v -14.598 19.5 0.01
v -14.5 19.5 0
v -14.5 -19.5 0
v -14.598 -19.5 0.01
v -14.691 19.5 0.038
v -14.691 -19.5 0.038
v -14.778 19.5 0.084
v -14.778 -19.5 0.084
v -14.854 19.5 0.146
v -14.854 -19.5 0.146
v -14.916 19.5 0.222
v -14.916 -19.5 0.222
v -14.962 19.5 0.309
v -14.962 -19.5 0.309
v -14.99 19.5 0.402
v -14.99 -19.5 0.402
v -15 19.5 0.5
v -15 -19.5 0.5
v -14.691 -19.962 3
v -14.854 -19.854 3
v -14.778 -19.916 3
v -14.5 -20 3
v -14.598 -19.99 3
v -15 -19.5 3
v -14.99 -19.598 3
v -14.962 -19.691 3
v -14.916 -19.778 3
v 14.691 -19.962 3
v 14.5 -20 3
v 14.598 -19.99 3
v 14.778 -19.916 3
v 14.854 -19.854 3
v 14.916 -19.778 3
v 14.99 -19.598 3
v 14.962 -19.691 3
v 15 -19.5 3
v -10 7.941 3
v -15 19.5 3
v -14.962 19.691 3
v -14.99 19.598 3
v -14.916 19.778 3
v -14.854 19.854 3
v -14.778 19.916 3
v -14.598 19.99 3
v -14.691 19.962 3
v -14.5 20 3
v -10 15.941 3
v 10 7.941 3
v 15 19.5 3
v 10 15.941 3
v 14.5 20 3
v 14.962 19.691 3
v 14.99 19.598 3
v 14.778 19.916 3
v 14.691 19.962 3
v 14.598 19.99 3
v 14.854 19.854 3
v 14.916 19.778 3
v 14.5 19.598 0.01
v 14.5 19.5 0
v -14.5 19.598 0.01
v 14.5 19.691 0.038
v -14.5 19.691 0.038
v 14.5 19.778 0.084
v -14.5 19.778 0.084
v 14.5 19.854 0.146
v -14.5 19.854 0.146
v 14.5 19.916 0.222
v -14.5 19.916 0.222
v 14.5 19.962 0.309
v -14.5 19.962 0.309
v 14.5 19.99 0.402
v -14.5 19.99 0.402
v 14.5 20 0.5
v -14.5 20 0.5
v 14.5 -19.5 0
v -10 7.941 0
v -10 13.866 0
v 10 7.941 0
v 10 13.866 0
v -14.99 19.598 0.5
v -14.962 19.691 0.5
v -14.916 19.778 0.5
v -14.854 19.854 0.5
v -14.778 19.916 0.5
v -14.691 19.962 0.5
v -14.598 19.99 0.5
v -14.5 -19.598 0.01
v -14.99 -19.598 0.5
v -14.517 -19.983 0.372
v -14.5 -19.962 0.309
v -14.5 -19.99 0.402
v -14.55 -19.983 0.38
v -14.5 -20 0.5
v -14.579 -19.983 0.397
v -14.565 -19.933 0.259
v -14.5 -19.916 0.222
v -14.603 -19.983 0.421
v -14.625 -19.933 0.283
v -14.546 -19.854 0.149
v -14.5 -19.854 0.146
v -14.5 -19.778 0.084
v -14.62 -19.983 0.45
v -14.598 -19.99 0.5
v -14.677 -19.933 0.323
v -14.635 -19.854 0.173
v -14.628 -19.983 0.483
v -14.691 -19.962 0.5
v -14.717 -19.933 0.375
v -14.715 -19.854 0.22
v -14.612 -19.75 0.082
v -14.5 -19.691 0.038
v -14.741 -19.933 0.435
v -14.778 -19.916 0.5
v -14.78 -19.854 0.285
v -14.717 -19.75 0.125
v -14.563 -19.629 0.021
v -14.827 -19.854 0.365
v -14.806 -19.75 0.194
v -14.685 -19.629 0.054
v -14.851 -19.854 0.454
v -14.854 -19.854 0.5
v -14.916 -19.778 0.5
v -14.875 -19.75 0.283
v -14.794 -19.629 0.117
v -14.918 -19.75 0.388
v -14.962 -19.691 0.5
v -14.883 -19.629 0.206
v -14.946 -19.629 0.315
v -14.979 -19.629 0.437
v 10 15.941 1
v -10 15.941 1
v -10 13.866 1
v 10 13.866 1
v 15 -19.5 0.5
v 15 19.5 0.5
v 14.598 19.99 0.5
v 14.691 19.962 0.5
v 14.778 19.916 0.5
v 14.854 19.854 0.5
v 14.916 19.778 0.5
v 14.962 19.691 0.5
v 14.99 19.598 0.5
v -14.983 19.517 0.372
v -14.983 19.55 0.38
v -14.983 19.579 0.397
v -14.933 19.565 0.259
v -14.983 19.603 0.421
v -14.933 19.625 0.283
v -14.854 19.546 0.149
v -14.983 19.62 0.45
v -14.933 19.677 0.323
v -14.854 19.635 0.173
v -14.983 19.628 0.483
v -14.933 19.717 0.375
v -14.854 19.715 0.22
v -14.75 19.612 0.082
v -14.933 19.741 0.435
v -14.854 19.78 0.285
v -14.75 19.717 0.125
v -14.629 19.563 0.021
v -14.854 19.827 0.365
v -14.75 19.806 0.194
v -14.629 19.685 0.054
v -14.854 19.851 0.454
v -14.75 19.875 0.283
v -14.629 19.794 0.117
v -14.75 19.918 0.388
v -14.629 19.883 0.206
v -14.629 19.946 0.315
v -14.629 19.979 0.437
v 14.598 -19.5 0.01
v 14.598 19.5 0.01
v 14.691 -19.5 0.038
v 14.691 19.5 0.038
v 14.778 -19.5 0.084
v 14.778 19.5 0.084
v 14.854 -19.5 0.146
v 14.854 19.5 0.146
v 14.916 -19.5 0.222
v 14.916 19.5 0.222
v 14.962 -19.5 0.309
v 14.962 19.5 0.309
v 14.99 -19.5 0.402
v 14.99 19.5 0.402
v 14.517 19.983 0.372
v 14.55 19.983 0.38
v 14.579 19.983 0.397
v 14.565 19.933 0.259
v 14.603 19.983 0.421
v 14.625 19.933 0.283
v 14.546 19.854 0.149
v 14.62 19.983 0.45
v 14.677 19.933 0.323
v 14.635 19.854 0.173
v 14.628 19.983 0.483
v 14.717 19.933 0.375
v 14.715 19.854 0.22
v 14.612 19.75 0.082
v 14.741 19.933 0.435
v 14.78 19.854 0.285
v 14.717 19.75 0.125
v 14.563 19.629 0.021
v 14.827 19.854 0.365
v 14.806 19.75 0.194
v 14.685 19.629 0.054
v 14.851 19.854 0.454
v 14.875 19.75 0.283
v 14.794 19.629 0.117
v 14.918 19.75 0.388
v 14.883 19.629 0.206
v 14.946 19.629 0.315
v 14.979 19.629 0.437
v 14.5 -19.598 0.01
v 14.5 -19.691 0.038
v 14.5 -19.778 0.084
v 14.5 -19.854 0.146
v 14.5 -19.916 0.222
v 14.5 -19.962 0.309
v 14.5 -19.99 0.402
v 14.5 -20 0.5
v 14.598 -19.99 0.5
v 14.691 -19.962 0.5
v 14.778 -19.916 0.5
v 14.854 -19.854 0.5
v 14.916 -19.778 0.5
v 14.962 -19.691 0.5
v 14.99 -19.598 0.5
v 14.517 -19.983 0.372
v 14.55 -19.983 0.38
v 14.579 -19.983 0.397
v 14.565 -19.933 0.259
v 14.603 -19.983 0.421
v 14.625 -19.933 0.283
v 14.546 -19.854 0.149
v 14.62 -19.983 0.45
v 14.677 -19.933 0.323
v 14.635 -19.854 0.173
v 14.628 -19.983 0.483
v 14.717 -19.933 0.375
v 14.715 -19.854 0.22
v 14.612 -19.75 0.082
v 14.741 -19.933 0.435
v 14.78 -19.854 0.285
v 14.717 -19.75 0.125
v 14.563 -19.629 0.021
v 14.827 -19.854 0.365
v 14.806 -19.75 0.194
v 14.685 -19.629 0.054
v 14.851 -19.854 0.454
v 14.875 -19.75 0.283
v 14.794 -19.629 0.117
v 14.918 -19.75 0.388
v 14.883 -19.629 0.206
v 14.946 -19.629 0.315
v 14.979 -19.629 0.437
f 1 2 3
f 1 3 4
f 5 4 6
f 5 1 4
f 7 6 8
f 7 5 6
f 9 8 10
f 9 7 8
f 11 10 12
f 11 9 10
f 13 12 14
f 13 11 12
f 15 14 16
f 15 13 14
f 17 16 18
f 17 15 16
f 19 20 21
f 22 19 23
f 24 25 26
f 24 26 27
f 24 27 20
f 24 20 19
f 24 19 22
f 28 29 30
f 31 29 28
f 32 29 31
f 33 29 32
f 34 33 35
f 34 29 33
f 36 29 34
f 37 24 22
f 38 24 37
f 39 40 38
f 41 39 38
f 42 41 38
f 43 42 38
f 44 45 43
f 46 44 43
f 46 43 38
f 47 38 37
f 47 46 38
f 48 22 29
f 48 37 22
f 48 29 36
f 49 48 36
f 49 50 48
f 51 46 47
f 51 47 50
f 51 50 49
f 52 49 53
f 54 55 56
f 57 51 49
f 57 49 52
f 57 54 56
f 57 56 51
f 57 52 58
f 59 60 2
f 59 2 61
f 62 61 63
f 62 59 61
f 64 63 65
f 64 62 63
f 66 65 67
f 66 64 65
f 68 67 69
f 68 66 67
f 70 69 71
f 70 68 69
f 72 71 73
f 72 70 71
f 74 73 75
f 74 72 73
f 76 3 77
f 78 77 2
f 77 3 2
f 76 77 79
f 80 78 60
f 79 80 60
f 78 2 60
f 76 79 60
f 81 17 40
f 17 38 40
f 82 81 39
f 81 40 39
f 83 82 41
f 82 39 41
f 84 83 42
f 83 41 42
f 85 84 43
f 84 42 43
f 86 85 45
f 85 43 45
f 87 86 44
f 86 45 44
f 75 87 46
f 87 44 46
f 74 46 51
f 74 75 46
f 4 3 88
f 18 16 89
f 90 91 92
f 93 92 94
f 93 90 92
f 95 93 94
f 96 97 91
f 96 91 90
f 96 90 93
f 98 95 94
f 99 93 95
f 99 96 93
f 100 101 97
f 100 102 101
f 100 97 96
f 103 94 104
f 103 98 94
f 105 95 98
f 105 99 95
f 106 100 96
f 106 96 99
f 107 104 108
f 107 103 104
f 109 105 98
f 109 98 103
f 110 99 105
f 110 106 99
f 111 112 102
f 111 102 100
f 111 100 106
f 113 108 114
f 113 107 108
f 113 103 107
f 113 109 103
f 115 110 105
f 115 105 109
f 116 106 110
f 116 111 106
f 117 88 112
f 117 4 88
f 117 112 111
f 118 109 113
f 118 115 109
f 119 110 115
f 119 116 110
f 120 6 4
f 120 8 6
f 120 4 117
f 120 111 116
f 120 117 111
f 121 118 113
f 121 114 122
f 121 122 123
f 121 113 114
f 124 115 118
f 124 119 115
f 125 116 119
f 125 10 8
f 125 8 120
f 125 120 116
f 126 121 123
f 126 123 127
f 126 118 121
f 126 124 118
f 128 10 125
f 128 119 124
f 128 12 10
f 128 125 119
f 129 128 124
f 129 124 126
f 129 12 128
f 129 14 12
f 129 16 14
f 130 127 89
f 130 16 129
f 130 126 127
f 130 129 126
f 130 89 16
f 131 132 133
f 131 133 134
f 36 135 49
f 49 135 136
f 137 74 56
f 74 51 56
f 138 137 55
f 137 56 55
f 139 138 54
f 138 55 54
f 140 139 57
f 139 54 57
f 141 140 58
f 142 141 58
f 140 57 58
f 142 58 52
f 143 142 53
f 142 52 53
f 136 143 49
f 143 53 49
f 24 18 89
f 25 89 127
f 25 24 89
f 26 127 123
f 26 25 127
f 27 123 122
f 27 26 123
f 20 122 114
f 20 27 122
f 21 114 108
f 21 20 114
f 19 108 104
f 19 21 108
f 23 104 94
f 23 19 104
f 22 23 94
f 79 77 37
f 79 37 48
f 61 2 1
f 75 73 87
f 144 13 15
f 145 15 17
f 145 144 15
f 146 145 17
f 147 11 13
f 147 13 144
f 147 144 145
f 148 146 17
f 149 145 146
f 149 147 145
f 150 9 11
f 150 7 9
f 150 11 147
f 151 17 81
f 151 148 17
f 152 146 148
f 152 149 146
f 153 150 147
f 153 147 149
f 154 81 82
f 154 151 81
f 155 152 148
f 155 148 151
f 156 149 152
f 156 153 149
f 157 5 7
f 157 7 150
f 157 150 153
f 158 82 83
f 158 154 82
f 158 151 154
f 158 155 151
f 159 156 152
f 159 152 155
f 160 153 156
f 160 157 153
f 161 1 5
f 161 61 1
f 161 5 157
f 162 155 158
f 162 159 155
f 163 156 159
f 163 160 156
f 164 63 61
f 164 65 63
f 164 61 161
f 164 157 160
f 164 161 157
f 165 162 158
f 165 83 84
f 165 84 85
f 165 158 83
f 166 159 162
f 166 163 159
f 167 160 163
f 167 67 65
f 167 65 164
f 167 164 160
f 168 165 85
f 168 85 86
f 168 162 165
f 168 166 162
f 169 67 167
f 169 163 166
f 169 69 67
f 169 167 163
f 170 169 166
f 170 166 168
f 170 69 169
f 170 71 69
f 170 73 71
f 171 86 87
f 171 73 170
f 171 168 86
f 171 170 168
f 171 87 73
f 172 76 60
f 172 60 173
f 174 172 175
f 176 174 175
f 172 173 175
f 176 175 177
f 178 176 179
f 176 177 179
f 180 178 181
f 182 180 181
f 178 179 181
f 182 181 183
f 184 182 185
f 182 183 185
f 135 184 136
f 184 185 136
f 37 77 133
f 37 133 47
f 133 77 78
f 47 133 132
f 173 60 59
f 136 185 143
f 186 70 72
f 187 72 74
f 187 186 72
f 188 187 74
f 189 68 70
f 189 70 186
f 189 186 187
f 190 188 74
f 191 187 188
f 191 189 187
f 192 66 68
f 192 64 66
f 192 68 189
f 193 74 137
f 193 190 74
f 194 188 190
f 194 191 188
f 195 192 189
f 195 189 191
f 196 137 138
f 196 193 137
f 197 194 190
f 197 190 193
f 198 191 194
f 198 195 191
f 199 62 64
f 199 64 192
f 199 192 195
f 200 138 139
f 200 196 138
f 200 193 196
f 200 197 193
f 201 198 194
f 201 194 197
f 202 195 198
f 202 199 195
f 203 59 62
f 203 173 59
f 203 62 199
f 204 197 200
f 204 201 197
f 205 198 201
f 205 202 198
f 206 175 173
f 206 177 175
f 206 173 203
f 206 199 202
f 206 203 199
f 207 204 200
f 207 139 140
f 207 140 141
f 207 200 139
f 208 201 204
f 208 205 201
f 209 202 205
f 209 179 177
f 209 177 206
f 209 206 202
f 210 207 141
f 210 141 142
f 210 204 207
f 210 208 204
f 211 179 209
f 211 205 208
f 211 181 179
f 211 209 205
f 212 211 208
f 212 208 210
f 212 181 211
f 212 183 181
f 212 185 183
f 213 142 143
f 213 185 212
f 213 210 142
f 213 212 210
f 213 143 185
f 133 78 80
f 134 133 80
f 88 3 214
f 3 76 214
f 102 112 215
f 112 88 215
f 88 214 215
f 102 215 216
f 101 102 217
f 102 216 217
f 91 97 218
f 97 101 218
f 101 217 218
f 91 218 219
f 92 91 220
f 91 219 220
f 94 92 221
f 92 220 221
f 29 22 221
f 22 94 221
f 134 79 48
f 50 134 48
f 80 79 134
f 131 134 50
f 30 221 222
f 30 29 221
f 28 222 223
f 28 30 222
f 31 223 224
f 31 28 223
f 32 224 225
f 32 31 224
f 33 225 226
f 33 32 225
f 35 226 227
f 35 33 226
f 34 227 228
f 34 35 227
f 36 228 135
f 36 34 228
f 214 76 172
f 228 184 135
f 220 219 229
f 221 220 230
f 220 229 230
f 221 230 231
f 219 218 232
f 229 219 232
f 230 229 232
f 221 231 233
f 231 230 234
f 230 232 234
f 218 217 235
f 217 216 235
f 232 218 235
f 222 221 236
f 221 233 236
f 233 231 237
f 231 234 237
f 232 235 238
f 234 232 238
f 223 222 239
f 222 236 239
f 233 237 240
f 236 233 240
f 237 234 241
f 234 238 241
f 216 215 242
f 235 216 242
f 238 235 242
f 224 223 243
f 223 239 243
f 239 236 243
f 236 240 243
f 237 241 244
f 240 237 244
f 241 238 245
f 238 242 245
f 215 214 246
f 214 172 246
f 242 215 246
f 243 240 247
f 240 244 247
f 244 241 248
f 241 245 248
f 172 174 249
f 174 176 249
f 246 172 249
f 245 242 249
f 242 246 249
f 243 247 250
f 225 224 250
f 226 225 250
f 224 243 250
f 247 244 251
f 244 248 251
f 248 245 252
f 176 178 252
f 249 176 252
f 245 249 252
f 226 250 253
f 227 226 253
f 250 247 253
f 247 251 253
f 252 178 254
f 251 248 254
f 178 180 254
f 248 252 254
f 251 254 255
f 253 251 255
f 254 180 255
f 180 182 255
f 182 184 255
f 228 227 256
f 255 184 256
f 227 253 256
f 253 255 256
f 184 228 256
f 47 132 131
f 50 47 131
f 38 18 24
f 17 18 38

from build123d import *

# Parameters (mm, degrees)
F0_W     = 30
F0_H     = 40
F0_W_2   = 20
F0_H_2   = 8
F2_DEPTH = 3
F1_W     = 20
F1_H     = 3
F3_DEPTH = 1
F4_R     = 0.5


with BuildPart() as f2:
    # F0 (on Top) → F2 (new body)
    with BuildSketch(Plane.XY):
        Rectangle(F0_W, F0_H)
        with Locations((0, 11.941392)):
            Rectangle(F0_W_2, F0_H_2, mode=Mode.SUBTRACT)
    extrude(amount=F2_DEPTH)

    # F1 (on face) → F3 (join)
    with BuildSketch(Plane.XY):
        with Locations((0, 15.365714)):
            Rectangle(F1_W, F1_H)
    extrude(amount=F3_DEPTH)

    # F4
    f4_edges = [f2.edges().sort_by_distance(p)[0] for p in [
        (15, 0, 0),
        (0, 20, 0),
        (-15, 0, 0),
        (0, -20, 0),
        (-15, -20, 1.5),
        (15, -20, 1.5),
        (-15, 20, 1.5),
        (15, 20, 1.5),
    ]]
    fillet(f4_edges, radius=F4_R)


solid = f2.part
